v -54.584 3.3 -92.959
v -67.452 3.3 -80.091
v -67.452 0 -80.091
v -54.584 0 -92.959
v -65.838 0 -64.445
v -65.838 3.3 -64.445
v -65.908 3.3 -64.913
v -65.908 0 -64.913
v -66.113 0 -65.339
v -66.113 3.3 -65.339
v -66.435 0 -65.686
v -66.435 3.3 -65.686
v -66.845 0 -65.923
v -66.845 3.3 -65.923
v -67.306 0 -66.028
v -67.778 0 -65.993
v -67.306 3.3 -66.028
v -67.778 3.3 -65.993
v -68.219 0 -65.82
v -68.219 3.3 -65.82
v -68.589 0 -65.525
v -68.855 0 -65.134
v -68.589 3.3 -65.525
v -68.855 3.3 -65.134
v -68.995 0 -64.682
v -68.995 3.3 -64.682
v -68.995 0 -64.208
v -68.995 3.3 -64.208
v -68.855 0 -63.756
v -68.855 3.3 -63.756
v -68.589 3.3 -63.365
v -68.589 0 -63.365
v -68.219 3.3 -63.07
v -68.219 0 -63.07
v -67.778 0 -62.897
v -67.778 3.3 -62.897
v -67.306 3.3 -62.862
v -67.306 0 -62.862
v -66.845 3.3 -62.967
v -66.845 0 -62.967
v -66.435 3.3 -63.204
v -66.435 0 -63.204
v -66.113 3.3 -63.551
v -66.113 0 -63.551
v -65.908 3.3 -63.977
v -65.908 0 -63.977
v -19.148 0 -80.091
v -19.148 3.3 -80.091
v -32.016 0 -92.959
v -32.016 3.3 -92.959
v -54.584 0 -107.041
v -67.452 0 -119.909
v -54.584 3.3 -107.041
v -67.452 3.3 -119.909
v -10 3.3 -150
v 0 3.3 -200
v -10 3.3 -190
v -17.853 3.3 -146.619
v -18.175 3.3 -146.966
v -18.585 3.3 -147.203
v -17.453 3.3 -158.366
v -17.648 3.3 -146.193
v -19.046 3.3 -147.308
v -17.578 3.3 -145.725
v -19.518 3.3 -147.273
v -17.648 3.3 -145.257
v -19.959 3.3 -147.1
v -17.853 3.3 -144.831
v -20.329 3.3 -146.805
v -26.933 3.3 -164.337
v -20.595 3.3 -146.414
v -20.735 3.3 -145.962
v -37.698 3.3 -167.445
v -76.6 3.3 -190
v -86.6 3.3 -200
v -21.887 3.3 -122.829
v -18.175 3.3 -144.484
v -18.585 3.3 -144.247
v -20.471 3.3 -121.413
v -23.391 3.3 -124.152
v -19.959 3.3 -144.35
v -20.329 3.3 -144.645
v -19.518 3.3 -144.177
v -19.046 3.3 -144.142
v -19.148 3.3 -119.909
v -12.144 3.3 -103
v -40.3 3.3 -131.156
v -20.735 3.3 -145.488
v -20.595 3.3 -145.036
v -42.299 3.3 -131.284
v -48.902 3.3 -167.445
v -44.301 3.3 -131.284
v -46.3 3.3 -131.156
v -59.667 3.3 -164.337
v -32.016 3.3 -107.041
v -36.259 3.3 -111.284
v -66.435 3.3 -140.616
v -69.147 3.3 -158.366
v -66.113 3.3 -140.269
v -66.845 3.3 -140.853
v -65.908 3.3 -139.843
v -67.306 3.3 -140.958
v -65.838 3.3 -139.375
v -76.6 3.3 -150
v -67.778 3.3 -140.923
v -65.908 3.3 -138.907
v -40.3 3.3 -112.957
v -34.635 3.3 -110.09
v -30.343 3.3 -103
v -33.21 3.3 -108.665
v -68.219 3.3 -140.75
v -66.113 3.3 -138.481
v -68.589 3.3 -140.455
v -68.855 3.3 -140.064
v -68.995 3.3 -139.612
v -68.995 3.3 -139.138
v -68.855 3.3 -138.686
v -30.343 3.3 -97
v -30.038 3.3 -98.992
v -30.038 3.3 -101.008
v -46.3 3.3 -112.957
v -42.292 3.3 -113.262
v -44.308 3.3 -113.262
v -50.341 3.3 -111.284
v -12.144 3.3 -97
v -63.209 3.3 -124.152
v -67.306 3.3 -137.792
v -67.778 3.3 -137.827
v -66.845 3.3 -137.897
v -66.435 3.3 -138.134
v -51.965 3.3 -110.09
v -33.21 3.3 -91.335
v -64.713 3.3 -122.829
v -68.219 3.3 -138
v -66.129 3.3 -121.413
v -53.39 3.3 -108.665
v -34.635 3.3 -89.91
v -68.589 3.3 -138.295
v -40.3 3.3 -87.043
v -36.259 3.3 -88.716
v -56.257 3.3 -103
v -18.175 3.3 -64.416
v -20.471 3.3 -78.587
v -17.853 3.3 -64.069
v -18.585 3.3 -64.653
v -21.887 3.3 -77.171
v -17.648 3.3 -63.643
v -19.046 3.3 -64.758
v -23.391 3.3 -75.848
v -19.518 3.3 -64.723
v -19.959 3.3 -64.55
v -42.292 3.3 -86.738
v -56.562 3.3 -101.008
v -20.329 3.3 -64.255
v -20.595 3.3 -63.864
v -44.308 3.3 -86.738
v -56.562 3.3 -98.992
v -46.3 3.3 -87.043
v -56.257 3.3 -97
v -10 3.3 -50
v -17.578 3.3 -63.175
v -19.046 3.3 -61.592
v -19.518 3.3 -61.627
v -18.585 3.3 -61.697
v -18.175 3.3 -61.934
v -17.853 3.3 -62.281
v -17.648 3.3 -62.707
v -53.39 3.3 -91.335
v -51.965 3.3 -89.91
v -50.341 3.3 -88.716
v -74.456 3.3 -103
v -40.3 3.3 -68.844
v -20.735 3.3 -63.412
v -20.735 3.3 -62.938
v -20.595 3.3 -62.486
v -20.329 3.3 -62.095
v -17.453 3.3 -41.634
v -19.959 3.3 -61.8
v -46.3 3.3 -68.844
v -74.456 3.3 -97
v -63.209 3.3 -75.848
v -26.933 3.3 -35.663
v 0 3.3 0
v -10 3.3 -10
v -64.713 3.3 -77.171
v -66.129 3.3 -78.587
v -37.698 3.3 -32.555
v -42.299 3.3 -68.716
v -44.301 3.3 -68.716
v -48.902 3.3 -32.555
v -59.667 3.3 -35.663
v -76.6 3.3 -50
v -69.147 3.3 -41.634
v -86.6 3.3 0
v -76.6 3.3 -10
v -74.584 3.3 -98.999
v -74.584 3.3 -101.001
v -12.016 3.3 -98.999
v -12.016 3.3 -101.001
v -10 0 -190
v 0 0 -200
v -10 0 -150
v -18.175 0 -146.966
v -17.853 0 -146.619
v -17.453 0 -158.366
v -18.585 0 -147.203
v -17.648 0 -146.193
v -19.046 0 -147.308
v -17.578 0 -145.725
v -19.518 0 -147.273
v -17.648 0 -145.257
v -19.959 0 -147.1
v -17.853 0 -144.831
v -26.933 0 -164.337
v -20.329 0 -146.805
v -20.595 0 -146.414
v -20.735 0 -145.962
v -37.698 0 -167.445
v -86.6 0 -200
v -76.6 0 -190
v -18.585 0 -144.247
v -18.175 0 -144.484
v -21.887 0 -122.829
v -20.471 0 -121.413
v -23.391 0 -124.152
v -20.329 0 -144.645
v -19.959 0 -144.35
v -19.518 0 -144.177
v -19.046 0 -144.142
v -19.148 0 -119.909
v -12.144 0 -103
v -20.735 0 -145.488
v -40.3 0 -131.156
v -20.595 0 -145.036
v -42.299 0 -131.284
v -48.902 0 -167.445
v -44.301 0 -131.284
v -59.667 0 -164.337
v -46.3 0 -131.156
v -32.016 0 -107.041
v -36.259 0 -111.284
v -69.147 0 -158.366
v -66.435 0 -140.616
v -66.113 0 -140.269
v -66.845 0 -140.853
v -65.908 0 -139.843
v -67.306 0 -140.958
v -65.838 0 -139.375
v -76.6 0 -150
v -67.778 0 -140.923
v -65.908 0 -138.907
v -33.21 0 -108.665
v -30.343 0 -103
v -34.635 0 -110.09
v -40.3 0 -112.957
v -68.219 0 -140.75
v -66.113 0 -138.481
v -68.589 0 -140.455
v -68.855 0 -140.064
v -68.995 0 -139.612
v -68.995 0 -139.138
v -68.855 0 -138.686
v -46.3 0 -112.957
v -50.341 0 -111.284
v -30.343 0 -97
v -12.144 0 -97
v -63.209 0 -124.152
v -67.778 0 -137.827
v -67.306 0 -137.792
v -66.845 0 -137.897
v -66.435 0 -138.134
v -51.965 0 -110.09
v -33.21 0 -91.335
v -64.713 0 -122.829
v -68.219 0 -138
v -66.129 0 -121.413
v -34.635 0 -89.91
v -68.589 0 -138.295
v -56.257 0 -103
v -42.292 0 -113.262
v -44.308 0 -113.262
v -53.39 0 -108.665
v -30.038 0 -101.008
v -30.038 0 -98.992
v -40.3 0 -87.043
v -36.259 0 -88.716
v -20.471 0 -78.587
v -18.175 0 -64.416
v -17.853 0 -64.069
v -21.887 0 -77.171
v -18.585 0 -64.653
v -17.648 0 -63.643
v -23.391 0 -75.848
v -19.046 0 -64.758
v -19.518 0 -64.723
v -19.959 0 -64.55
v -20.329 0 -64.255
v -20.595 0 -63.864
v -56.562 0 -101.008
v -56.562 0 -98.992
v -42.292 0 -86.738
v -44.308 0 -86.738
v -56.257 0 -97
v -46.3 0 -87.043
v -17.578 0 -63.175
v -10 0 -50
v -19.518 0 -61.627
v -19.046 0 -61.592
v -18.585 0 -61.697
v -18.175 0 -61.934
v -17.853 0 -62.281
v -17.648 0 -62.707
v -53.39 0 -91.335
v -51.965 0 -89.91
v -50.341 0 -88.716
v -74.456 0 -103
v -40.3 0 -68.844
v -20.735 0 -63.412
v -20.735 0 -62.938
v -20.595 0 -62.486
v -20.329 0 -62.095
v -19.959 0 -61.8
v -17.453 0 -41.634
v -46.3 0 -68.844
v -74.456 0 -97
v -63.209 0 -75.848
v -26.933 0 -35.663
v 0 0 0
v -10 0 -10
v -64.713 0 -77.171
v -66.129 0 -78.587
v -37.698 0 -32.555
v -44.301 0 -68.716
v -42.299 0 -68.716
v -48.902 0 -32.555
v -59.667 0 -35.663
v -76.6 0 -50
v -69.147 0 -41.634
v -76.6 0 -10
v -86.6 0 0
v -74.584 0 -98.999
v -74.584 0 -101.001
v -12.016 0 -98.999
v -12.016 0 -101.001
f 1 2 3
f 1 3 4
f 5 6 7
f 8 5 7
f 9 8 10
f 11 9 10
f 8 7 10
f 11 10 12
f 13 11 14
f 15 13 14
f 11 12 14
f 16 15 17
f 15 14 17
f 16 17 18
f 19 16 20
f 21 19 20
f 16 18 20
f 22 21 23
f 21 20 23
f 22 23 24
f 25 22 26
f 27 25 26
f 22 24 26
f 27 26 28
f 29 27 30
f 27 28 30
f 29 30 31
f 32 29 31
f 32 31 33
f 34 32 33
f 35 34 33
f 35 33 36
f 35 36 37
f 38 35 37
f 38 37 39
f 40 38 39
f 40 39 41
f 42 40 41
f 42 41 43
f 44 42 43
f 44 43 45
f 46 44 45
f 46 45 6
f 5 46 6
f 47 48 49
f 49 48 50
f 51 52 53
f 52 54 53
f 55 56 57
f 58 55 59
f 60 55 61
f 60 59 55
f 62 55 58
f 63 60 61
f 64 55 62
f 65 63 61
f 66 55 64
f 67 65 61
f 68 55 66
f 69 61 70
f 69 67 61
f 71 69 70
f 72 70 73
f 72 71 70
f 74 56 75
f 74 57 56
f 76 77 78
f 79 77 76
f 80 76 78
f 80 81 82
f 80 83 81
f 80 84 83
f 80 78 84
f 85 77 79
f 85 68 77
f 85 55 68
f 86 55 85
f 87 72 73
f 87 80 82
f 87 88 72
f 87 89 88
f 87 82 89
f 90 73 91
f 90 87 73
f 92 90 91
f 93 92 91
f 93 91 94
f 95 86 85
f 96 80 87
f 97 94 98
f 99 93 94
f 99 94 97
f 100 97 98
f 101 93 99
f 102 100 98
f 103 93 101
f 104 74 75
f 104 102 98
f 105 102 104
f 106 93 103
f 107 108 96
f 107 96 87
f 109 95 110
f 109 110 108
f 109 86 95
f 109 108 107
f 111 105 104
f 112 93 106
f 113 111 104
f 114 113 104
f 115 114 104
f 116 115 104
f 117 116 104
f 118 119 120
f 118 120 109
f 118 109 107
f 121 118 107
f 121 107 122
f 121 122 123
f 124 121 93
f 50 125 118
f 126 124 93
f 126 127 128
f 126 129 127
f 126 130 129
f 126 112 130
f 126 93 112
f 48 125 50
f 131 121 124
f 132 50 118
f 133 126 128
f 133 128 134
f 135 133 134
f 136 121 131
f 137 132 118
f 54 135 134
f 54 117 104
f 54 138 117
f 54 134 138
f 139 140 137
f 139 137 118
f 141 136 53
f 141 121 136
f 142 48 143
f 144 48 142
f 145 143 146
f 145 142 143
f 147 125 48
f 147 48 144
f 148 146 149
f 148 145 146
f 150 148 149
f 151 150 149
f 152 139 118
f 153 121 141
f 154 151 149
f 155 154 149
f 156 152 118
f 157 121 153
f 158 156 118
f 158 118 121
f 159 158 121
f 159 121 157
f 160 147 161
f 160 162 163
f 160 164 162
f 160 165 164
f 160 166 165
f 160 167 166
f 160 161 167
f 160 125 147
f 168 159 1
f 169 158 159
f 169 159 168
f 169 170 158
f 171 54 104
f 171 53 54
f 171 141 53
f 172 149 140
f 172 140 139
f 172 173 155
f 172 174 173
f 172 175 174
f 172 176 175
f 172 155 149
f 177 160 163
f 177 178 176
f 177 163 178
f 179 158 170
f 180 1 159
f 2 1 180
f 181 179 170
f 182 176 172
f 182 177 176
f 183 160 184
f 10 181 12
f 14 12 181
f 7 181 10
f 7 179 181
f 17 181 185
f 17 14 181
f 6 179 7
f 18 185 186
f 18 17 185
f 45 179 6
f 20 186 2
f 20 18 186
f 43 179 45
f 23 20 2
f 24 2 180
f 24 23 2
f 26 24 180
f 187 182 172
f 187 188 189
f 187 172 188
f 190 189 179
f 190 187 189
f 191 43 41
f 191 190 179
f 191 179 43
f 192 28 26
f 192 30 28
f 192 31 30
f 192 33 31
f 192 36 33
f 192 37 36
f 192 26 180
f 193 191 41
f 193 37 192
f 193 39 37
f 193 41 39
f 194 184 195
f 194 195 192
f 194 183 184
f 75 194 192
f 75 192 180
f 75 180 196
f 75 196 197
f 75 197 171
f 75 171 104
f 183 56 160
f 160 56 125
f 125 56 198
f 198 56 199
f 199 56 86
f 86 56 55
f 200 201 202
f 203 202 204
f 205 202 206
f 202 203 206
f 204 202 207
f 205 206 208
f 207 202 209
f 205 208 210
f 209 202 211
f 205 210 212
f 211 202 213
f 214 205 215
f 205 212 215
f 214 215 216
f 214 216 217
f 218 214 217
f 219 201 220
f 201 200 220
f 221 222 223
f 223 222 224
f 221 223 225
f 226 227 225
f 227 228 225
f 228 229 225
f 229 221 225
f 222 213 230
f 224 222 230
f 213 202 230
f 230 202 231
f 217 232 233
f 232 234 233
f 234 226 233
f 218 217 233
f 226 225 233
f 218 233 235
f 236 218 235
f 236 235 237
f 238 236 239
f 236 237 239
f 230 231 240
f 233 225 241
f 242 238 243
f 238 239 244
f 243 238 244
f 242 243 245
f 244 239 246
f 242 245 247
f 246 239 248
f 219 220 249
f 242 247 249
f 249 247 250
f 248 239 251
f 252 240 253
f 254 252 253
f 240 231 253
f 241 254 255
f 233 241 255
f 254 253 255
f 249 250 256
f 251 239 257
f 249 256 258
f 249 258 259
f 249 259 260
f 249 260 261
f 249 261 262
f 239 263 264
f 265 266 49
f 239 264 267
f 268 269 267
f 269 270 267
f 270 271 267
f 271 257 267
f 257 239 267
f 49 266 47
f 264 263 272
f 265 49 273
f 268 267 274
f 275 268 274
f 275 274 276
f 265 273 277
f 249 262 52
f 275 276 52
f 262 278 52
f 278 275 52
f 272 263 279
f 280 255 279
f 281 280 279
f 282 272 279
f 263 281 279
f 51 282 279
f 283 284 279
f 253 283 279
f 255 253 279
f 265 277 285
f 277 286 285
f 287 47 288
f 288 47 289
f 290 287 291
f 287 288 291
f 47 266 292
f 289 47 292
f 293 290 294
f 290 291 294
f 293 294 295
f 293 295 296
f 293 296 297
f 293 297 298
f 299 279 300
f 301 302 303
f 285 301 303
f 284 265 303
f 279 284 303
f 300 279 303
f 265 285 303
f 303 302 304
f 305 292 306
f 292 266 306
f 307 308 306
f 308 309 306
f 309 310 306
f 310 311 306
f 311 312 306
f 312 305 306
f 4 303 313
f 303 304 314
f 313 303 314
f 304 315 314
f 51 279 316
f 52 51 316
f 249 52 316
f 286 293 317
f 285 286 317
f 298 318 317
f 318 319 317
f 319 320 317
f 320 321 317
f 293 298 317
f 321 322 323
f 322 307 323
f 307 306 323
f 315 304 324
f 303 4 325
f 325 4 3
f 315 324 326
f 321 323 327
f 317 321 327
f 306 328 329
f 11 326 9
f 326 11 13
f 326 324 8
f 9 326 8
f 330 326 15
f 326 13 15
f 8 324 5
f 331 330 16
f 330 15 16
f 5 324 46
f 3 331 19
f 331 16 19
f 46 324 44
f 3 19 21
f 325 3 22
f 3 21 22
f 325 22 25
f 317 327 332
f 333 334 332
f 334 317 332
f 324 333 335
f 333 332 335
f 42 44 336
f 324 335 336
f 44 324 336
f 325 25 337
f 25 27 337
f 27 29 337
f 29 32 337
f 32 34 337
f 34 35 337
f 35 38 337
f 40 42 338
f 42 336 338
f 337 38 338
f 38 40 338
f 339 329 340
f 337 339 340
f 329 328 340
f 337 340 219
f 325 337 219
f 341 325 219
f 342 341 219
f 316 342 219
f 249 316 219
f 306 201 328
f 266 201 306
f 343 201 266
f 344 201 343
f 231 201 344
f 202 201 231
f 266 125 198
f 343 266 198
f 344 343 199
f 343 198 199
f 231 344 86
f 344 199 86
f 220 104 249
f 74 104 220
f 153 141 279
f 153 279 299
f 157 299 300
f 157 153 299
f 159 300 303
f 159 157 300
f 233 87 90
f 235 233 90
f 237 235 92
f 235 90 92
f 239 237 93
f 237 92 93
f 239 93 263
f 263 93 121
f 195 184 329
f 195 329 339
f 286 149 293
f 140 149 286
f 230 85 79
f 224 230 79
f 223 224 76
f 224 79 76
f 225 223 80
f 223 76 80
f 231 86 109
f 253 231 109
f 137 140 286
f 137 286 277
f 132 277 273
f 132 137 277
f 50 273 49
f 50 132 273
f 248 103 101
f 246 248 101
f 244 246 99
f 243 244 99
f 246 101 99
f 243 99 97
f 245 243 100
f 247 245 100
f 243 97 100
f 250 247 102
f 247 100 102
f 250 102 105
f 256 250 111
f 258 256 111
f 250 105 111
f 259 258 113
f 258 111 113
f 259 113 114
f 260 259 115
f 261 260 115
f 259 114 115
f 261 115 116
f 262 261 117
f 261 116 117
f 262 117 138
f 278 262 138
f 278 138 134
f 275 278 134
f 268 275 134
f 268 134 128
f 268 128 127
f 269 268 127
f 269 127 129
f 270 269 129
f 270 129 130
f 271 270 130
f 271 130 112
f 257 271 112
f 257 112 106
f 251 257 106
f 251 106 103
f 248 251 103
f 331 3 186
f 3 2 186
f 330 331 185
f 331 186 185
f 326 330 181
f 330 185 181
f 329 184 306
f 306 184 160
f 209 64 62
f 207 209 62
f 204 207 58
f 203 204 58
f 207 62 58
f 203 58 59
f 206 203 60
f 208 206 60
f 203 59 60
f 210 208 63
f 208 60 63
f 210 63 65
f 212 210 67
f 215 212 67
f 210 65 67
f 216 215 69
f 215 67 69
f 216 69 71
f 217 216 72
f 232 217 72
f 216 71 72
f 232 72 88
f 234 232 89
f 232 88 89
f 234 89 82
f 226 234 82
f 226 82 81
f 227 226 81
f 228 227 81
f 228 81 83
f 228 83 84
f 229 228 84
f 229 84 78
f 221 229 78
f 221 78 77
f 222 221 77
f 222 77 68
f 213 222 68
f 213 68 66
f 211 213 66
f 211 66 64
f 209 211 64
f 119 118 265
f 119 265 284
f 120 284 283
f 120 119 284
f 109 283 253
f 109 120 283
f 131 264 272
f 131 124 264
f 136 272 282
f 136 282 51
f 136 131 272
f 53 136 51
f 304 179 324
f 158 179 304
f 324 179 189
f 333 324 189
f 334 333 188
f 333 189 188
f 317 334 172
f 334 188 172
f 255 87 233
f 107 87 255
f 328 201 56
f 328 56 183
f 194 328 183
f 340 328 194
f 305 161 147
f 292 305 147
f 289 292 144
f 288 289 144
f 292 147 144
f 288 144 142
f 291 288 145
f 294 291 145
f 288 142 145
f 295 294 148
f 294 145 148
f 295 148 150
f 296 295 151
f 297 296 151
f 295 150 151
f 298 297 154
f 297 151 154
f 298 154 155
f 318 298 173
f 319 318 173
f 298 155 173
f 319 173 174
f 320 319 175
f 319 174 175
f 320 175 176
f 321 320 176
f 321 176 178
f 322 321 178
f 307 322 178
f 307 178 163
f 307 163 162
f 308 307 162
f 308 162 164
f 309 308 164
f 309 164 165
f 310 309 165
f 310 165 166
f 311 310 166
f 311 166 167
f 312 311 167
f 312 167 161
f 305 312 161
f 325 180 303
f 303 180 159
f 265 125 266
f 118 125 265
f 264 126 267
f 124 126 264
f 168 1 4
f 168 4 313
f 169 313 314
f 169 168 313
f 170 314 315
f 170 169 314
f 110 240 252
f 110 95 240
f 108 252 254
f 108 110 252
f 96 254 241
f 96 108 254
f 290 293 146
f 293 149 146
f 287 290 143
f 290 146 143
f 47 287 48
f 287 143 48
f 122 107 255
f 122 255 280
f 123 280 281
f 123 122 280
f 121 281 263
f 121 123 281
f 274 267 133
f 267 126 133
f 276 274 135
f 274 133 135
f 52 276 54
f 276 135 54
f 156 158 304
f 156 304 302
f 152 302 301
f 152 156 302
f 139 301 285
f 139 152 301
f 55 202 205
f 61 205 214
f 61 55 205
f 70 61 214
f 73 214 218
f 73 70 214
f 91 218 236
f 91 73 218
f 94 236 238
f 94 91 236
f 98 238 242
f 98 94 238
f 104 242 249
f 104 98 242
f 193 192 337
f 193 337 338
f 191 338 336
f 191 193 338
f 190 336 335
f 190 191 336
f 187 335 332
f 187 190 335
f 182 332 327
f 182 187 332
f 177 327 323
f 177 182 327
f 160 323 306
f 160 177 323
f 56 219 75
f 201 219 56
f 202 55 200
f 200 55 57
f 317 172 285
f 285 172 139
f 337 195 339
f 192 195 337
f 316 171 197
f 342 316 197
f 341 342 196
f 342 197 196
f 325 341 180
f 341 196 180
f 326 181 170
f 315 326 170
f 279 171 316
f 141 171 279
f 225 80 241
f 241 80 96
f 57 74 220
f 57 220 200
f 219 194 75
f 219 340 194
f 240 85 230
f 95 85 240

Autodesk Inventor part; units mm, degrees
ref_plane "YZ Plane" through (0, 0, 0) normal (1, 0, 0) x (0, 1, 0)
ref_plane "XZ Plane" through (0, 0, 0) normal (0, 1, 0) x (-1, 0, 0)
sketch "Boceto1" plane through (0, 0, 0) normal (0, 1, 0) x (-1, 0, 0)
  line L0 (0, 0) -> (86.6, 0)
  line L1 (86.6, 0) -> (86.6, -200)
  line L2 (86.6, -200) -> (0, -200)
  line L3 (0, -200) -> (0, 0)
  dimension "d0" = 200
  dimension "d1" = 86.6
extrude "Extrusión1" add sketch "Boceto1" along normal blind 3.3
sketch "Boceto2" plane through (0, 3.3, 0) normal (0, 1, 0) x (1, 0, 0)
  circle A0 centre (-43.3, 100) radius 13.3 construction
  circle A1 centre (-43.3, 100) radius 31.3 construction
  line L0 (-86.6, 0) -> (0, 0) projected
  line L1 (0, 0) -> (0, 200) projected
  line L2 (0, 200) -> (-86.6, 200) projected
  line L3 (-86.6, 200) -> (-86.6, 0) projected
  line L4 (0, 200) -> (-86.6, 200) projected
  line L5 (-46.3, 68.8441) -> (-46.3, 87.0428)
  line L6 (-40.3, 68.8441) -> (-40.3, 87.0428)
  arc A2 (-46.3, 87.0428) -> (-40.3, 87.0428) centre (-43.3, 100) ccw
  arc A3 (-46.3, 68.8441) -> (-40.3, 68.8441) centre (-43.3, 100) ccw
  line L7 (-19.1481, 80.0908) -> (-32.0165, 92.9592)
  arc A4 (-23.3908, 75.8481) -> (-19.1481, 80.0908) centre (-43.3, 100) ccw
  line L8 (-23.3908, 75.8481) -> (-36.2592, 88.7165)
  arc A5 (-36.2592, 88.7165) -> (-32.0165, 92.9592) centre (-43.3, 100) ccw
  line L9 (-12.1441, 103) -> (-30.3428, 103)
  arc A6 (-12.1441, 97) -> (-12.1441, 103) centre (-43.3, 100) ccw
  line L10 (-12.1441, 97) -> (-30.3428, 97)
  arc A7 (-30.3428, 97) -> (-30.3428, 103) centre (-43.3, 100) ccw
  line L11 (-23.3908, 124.1519) -> (-36.2592, 111.2835)
  arc A8 (-19.1481, 119.9092) -> (-23.3908, 124.1519) centre (-43.3, 100) ccw
  line L12 (-19.1481, 119.9092) -> (-32.0165, 107.0408)
  arc A9 (-32.0165, 107.0408) -> (-36.2592, 111.2835) centre (-43.3, 100) ccw
  line L13 (-46.3, 131.1559) -> (-46.3, 112.9572)
  arc A10 (-40.3, 131.1559) -> (-46.3, 131.1559) centre (-43.3, 100) ccw
  line L14 (-40.3, 131.1559) -> (-40.3, 112.9572)
  arc A11 (-40.3, 112.9572) -> (-46.3, 112.9572) centre (-43.3, 100) ccw
  line L15 (-67.4519, 119.9092) -> (-54.5835, 107.0408)
  arc A12 (-63.2092, 124.1519) -> (-67.4519, 119.9092) centre (-43.3, 100) ccw
  line L16 (-63.2092, 124.1519) -> (-50.3408, 111.2835)
  arc A13 (-50.3408, 111.2835) -> (-54.5835, 107.0408) centre (-43.3, 100) ccw
  line L17 (-74.4559, 97) -> (-56.2572, 97)
  arc A14 (-74.4559, 103) -> (-74.4559, 97) centre (-43.3, 100) ccw
  line L18 (-74.4559, 103) -> (-56.2572, 103)
  arc A15 (-56.2572, 103) -> (-56.2572, 97) centre (-43.3, 100) ccw
  line L19 (-63.2092, 75.8481) -> (-50.3408, 88.7165)
  arc A16 (-67.4519, 80.0908) -> (-63.2092, 75.8481) centre (-43.3, 100) ccw
  line L20 (-67.4519, 80.0908) -> (-54.5835, 92.9592)
  arc A17 (-54.5835, 92.9592) -> (-50.3408, 88.7165) centre (-43.3, 100) ccw
  line L21 (-86.6, 200) -> (-86.6, 0) projected
  line L22 (0, 0) -> (0, 200) projected
  point P0 (-43.3, 200)
  point P1 (-86.6, 100)
  point P2 (-43.3, 200)
  point P3 (-43.3, 86.7)
  point P4 (-33.8955, 90.5955)
  point P5 (-30, 100)
  point P6 (-33.8955, 109.4045)
  point P7 (-43.3, 113.3)
  point P8 (-52.7045, 109.4045)
  point P9 (-56.6, 100)
  point P10 (-52.7045, 90.5955)
  dimension "d10" = 18
  dimension "d11" = 6
  dimension "d14" = 360
  dimension "d19" = 30
extrude "Extrusión2" cut sketch "Boceto2" against normal blind 10 contours L5 A2 L6 A3 | A4 L8 A5 L7 | A6 L10 A7 L9 | A8 L12 A9 L11 | A10 L14 A11 L13 | A12 L16 A13 L15 | A14 L18 A15 L17 | A16 L20 A17 L19
sketch "Sketch3" plane through (0, 3.3, 0) normal (0, 1, 0) x (1, 0, 0)
  line L0 (-86.6, 200) -> (-86.6, 0) projected
  line L1 (-69.975, 150.795) -> (-16.625, 150.795) construction
  line L2 (-16.625, 150.795) -> (-16.625, 49.205) construction
  line L3 (-16.625, 49.205) -> (-69.975, 49.205) construction
  line L4 (-69.975, 49.205) -> (-69.975, 150.795) construction
  line L5 (0, 200) -> (-86.6, 200) projected
  circle A0 centre (-67.425, 64.445) radius 1.5875
  circle A1 centre (-19.165, 63.175) radius 1.5875
  circle A2 centre (-19.165, 145.725) radius 1.5875
  circle A3 centre (-67.425, 139.375) radius 1.5875
  circle A4 centre (-24.245, 115.245) radius 1.5875
  point P0 (0, 0)
  dimension "d21" = 101.59
  dimension "d22" = 53.35
  dimension "d23" = 16.625
  dimension "d24" = 49.205
  dimension "d25" = 15.24
  dimension "d26" = 3.175
  dimension "d28" = 50.8
  dimension "d29" = 13.97
  dimension "d30" = 2.54
  dimension "d31" = 90.17
  dimension "d32" = 96.52
  dimension "d34" = 50.8
  dimension "d35" = 2.54
  dimension "d36" = 66.04
  dimension "d37" = 7.62
extrude "Extrusion3" cut sketch "Sketch3" against normal blind 10 contours A0 | A1 | A2 | A3
sketch "Sketch4" plane through (0, 3.3, 0) normal (0, 1, 0) x (1, 0, 0)
  line L0 (-10, 10) -> (-76.6, 10)
  line L1 (-76.6, 10) -> (-76.6, 50)
  line L2 (-10, 10) -> (-10, 50)
  arc A0 (-76.6, 50) -> (-10, 50) centre (-43.3, 72.161) ccw
  line L3 (-86.6, 0) -> (0, 0) projected
  line L4 (-86.6, 200) -> (-86.6, 0) projected
  line L5 (0, 0) -> (0, 200) projected
  dimension "d40" = 10
  dimension "d41" = 10
  dimension "d42" = 10
  dimension "d43" = 40
  dimension "d44" = 40
ref_plane "Work Plane1" through (0, 0, -100) normal (0, 0, -1) x (-1, 0, 0)
extrude "Extrusion4" cut sketch "Sketch4" against normal blind 10
mirror "Mirror1" about plane through (0, 0, -100) normal (0, 0, -1) of "Extrusion4"
equation "\"d0\" = largo_base"
equation "\"d10\" = 1.5 * d4"
equation "\"d11\" = 0.2 * d19"
equation "\"d19\" = d8"
equation "\"d24\" = 0.5 * largo_base - 0.5 * d21"
equation "\"d34\" = d28"
equation "\"d35\" = d30"
equation "\"ancho_base\" = 80"
equation "\"largo_base\" = 200"
equation "\"d4\" = 12"
equation "\"d8\" = 30"
properties part number "Cuerpo - Base" material "ABS Plastic"
